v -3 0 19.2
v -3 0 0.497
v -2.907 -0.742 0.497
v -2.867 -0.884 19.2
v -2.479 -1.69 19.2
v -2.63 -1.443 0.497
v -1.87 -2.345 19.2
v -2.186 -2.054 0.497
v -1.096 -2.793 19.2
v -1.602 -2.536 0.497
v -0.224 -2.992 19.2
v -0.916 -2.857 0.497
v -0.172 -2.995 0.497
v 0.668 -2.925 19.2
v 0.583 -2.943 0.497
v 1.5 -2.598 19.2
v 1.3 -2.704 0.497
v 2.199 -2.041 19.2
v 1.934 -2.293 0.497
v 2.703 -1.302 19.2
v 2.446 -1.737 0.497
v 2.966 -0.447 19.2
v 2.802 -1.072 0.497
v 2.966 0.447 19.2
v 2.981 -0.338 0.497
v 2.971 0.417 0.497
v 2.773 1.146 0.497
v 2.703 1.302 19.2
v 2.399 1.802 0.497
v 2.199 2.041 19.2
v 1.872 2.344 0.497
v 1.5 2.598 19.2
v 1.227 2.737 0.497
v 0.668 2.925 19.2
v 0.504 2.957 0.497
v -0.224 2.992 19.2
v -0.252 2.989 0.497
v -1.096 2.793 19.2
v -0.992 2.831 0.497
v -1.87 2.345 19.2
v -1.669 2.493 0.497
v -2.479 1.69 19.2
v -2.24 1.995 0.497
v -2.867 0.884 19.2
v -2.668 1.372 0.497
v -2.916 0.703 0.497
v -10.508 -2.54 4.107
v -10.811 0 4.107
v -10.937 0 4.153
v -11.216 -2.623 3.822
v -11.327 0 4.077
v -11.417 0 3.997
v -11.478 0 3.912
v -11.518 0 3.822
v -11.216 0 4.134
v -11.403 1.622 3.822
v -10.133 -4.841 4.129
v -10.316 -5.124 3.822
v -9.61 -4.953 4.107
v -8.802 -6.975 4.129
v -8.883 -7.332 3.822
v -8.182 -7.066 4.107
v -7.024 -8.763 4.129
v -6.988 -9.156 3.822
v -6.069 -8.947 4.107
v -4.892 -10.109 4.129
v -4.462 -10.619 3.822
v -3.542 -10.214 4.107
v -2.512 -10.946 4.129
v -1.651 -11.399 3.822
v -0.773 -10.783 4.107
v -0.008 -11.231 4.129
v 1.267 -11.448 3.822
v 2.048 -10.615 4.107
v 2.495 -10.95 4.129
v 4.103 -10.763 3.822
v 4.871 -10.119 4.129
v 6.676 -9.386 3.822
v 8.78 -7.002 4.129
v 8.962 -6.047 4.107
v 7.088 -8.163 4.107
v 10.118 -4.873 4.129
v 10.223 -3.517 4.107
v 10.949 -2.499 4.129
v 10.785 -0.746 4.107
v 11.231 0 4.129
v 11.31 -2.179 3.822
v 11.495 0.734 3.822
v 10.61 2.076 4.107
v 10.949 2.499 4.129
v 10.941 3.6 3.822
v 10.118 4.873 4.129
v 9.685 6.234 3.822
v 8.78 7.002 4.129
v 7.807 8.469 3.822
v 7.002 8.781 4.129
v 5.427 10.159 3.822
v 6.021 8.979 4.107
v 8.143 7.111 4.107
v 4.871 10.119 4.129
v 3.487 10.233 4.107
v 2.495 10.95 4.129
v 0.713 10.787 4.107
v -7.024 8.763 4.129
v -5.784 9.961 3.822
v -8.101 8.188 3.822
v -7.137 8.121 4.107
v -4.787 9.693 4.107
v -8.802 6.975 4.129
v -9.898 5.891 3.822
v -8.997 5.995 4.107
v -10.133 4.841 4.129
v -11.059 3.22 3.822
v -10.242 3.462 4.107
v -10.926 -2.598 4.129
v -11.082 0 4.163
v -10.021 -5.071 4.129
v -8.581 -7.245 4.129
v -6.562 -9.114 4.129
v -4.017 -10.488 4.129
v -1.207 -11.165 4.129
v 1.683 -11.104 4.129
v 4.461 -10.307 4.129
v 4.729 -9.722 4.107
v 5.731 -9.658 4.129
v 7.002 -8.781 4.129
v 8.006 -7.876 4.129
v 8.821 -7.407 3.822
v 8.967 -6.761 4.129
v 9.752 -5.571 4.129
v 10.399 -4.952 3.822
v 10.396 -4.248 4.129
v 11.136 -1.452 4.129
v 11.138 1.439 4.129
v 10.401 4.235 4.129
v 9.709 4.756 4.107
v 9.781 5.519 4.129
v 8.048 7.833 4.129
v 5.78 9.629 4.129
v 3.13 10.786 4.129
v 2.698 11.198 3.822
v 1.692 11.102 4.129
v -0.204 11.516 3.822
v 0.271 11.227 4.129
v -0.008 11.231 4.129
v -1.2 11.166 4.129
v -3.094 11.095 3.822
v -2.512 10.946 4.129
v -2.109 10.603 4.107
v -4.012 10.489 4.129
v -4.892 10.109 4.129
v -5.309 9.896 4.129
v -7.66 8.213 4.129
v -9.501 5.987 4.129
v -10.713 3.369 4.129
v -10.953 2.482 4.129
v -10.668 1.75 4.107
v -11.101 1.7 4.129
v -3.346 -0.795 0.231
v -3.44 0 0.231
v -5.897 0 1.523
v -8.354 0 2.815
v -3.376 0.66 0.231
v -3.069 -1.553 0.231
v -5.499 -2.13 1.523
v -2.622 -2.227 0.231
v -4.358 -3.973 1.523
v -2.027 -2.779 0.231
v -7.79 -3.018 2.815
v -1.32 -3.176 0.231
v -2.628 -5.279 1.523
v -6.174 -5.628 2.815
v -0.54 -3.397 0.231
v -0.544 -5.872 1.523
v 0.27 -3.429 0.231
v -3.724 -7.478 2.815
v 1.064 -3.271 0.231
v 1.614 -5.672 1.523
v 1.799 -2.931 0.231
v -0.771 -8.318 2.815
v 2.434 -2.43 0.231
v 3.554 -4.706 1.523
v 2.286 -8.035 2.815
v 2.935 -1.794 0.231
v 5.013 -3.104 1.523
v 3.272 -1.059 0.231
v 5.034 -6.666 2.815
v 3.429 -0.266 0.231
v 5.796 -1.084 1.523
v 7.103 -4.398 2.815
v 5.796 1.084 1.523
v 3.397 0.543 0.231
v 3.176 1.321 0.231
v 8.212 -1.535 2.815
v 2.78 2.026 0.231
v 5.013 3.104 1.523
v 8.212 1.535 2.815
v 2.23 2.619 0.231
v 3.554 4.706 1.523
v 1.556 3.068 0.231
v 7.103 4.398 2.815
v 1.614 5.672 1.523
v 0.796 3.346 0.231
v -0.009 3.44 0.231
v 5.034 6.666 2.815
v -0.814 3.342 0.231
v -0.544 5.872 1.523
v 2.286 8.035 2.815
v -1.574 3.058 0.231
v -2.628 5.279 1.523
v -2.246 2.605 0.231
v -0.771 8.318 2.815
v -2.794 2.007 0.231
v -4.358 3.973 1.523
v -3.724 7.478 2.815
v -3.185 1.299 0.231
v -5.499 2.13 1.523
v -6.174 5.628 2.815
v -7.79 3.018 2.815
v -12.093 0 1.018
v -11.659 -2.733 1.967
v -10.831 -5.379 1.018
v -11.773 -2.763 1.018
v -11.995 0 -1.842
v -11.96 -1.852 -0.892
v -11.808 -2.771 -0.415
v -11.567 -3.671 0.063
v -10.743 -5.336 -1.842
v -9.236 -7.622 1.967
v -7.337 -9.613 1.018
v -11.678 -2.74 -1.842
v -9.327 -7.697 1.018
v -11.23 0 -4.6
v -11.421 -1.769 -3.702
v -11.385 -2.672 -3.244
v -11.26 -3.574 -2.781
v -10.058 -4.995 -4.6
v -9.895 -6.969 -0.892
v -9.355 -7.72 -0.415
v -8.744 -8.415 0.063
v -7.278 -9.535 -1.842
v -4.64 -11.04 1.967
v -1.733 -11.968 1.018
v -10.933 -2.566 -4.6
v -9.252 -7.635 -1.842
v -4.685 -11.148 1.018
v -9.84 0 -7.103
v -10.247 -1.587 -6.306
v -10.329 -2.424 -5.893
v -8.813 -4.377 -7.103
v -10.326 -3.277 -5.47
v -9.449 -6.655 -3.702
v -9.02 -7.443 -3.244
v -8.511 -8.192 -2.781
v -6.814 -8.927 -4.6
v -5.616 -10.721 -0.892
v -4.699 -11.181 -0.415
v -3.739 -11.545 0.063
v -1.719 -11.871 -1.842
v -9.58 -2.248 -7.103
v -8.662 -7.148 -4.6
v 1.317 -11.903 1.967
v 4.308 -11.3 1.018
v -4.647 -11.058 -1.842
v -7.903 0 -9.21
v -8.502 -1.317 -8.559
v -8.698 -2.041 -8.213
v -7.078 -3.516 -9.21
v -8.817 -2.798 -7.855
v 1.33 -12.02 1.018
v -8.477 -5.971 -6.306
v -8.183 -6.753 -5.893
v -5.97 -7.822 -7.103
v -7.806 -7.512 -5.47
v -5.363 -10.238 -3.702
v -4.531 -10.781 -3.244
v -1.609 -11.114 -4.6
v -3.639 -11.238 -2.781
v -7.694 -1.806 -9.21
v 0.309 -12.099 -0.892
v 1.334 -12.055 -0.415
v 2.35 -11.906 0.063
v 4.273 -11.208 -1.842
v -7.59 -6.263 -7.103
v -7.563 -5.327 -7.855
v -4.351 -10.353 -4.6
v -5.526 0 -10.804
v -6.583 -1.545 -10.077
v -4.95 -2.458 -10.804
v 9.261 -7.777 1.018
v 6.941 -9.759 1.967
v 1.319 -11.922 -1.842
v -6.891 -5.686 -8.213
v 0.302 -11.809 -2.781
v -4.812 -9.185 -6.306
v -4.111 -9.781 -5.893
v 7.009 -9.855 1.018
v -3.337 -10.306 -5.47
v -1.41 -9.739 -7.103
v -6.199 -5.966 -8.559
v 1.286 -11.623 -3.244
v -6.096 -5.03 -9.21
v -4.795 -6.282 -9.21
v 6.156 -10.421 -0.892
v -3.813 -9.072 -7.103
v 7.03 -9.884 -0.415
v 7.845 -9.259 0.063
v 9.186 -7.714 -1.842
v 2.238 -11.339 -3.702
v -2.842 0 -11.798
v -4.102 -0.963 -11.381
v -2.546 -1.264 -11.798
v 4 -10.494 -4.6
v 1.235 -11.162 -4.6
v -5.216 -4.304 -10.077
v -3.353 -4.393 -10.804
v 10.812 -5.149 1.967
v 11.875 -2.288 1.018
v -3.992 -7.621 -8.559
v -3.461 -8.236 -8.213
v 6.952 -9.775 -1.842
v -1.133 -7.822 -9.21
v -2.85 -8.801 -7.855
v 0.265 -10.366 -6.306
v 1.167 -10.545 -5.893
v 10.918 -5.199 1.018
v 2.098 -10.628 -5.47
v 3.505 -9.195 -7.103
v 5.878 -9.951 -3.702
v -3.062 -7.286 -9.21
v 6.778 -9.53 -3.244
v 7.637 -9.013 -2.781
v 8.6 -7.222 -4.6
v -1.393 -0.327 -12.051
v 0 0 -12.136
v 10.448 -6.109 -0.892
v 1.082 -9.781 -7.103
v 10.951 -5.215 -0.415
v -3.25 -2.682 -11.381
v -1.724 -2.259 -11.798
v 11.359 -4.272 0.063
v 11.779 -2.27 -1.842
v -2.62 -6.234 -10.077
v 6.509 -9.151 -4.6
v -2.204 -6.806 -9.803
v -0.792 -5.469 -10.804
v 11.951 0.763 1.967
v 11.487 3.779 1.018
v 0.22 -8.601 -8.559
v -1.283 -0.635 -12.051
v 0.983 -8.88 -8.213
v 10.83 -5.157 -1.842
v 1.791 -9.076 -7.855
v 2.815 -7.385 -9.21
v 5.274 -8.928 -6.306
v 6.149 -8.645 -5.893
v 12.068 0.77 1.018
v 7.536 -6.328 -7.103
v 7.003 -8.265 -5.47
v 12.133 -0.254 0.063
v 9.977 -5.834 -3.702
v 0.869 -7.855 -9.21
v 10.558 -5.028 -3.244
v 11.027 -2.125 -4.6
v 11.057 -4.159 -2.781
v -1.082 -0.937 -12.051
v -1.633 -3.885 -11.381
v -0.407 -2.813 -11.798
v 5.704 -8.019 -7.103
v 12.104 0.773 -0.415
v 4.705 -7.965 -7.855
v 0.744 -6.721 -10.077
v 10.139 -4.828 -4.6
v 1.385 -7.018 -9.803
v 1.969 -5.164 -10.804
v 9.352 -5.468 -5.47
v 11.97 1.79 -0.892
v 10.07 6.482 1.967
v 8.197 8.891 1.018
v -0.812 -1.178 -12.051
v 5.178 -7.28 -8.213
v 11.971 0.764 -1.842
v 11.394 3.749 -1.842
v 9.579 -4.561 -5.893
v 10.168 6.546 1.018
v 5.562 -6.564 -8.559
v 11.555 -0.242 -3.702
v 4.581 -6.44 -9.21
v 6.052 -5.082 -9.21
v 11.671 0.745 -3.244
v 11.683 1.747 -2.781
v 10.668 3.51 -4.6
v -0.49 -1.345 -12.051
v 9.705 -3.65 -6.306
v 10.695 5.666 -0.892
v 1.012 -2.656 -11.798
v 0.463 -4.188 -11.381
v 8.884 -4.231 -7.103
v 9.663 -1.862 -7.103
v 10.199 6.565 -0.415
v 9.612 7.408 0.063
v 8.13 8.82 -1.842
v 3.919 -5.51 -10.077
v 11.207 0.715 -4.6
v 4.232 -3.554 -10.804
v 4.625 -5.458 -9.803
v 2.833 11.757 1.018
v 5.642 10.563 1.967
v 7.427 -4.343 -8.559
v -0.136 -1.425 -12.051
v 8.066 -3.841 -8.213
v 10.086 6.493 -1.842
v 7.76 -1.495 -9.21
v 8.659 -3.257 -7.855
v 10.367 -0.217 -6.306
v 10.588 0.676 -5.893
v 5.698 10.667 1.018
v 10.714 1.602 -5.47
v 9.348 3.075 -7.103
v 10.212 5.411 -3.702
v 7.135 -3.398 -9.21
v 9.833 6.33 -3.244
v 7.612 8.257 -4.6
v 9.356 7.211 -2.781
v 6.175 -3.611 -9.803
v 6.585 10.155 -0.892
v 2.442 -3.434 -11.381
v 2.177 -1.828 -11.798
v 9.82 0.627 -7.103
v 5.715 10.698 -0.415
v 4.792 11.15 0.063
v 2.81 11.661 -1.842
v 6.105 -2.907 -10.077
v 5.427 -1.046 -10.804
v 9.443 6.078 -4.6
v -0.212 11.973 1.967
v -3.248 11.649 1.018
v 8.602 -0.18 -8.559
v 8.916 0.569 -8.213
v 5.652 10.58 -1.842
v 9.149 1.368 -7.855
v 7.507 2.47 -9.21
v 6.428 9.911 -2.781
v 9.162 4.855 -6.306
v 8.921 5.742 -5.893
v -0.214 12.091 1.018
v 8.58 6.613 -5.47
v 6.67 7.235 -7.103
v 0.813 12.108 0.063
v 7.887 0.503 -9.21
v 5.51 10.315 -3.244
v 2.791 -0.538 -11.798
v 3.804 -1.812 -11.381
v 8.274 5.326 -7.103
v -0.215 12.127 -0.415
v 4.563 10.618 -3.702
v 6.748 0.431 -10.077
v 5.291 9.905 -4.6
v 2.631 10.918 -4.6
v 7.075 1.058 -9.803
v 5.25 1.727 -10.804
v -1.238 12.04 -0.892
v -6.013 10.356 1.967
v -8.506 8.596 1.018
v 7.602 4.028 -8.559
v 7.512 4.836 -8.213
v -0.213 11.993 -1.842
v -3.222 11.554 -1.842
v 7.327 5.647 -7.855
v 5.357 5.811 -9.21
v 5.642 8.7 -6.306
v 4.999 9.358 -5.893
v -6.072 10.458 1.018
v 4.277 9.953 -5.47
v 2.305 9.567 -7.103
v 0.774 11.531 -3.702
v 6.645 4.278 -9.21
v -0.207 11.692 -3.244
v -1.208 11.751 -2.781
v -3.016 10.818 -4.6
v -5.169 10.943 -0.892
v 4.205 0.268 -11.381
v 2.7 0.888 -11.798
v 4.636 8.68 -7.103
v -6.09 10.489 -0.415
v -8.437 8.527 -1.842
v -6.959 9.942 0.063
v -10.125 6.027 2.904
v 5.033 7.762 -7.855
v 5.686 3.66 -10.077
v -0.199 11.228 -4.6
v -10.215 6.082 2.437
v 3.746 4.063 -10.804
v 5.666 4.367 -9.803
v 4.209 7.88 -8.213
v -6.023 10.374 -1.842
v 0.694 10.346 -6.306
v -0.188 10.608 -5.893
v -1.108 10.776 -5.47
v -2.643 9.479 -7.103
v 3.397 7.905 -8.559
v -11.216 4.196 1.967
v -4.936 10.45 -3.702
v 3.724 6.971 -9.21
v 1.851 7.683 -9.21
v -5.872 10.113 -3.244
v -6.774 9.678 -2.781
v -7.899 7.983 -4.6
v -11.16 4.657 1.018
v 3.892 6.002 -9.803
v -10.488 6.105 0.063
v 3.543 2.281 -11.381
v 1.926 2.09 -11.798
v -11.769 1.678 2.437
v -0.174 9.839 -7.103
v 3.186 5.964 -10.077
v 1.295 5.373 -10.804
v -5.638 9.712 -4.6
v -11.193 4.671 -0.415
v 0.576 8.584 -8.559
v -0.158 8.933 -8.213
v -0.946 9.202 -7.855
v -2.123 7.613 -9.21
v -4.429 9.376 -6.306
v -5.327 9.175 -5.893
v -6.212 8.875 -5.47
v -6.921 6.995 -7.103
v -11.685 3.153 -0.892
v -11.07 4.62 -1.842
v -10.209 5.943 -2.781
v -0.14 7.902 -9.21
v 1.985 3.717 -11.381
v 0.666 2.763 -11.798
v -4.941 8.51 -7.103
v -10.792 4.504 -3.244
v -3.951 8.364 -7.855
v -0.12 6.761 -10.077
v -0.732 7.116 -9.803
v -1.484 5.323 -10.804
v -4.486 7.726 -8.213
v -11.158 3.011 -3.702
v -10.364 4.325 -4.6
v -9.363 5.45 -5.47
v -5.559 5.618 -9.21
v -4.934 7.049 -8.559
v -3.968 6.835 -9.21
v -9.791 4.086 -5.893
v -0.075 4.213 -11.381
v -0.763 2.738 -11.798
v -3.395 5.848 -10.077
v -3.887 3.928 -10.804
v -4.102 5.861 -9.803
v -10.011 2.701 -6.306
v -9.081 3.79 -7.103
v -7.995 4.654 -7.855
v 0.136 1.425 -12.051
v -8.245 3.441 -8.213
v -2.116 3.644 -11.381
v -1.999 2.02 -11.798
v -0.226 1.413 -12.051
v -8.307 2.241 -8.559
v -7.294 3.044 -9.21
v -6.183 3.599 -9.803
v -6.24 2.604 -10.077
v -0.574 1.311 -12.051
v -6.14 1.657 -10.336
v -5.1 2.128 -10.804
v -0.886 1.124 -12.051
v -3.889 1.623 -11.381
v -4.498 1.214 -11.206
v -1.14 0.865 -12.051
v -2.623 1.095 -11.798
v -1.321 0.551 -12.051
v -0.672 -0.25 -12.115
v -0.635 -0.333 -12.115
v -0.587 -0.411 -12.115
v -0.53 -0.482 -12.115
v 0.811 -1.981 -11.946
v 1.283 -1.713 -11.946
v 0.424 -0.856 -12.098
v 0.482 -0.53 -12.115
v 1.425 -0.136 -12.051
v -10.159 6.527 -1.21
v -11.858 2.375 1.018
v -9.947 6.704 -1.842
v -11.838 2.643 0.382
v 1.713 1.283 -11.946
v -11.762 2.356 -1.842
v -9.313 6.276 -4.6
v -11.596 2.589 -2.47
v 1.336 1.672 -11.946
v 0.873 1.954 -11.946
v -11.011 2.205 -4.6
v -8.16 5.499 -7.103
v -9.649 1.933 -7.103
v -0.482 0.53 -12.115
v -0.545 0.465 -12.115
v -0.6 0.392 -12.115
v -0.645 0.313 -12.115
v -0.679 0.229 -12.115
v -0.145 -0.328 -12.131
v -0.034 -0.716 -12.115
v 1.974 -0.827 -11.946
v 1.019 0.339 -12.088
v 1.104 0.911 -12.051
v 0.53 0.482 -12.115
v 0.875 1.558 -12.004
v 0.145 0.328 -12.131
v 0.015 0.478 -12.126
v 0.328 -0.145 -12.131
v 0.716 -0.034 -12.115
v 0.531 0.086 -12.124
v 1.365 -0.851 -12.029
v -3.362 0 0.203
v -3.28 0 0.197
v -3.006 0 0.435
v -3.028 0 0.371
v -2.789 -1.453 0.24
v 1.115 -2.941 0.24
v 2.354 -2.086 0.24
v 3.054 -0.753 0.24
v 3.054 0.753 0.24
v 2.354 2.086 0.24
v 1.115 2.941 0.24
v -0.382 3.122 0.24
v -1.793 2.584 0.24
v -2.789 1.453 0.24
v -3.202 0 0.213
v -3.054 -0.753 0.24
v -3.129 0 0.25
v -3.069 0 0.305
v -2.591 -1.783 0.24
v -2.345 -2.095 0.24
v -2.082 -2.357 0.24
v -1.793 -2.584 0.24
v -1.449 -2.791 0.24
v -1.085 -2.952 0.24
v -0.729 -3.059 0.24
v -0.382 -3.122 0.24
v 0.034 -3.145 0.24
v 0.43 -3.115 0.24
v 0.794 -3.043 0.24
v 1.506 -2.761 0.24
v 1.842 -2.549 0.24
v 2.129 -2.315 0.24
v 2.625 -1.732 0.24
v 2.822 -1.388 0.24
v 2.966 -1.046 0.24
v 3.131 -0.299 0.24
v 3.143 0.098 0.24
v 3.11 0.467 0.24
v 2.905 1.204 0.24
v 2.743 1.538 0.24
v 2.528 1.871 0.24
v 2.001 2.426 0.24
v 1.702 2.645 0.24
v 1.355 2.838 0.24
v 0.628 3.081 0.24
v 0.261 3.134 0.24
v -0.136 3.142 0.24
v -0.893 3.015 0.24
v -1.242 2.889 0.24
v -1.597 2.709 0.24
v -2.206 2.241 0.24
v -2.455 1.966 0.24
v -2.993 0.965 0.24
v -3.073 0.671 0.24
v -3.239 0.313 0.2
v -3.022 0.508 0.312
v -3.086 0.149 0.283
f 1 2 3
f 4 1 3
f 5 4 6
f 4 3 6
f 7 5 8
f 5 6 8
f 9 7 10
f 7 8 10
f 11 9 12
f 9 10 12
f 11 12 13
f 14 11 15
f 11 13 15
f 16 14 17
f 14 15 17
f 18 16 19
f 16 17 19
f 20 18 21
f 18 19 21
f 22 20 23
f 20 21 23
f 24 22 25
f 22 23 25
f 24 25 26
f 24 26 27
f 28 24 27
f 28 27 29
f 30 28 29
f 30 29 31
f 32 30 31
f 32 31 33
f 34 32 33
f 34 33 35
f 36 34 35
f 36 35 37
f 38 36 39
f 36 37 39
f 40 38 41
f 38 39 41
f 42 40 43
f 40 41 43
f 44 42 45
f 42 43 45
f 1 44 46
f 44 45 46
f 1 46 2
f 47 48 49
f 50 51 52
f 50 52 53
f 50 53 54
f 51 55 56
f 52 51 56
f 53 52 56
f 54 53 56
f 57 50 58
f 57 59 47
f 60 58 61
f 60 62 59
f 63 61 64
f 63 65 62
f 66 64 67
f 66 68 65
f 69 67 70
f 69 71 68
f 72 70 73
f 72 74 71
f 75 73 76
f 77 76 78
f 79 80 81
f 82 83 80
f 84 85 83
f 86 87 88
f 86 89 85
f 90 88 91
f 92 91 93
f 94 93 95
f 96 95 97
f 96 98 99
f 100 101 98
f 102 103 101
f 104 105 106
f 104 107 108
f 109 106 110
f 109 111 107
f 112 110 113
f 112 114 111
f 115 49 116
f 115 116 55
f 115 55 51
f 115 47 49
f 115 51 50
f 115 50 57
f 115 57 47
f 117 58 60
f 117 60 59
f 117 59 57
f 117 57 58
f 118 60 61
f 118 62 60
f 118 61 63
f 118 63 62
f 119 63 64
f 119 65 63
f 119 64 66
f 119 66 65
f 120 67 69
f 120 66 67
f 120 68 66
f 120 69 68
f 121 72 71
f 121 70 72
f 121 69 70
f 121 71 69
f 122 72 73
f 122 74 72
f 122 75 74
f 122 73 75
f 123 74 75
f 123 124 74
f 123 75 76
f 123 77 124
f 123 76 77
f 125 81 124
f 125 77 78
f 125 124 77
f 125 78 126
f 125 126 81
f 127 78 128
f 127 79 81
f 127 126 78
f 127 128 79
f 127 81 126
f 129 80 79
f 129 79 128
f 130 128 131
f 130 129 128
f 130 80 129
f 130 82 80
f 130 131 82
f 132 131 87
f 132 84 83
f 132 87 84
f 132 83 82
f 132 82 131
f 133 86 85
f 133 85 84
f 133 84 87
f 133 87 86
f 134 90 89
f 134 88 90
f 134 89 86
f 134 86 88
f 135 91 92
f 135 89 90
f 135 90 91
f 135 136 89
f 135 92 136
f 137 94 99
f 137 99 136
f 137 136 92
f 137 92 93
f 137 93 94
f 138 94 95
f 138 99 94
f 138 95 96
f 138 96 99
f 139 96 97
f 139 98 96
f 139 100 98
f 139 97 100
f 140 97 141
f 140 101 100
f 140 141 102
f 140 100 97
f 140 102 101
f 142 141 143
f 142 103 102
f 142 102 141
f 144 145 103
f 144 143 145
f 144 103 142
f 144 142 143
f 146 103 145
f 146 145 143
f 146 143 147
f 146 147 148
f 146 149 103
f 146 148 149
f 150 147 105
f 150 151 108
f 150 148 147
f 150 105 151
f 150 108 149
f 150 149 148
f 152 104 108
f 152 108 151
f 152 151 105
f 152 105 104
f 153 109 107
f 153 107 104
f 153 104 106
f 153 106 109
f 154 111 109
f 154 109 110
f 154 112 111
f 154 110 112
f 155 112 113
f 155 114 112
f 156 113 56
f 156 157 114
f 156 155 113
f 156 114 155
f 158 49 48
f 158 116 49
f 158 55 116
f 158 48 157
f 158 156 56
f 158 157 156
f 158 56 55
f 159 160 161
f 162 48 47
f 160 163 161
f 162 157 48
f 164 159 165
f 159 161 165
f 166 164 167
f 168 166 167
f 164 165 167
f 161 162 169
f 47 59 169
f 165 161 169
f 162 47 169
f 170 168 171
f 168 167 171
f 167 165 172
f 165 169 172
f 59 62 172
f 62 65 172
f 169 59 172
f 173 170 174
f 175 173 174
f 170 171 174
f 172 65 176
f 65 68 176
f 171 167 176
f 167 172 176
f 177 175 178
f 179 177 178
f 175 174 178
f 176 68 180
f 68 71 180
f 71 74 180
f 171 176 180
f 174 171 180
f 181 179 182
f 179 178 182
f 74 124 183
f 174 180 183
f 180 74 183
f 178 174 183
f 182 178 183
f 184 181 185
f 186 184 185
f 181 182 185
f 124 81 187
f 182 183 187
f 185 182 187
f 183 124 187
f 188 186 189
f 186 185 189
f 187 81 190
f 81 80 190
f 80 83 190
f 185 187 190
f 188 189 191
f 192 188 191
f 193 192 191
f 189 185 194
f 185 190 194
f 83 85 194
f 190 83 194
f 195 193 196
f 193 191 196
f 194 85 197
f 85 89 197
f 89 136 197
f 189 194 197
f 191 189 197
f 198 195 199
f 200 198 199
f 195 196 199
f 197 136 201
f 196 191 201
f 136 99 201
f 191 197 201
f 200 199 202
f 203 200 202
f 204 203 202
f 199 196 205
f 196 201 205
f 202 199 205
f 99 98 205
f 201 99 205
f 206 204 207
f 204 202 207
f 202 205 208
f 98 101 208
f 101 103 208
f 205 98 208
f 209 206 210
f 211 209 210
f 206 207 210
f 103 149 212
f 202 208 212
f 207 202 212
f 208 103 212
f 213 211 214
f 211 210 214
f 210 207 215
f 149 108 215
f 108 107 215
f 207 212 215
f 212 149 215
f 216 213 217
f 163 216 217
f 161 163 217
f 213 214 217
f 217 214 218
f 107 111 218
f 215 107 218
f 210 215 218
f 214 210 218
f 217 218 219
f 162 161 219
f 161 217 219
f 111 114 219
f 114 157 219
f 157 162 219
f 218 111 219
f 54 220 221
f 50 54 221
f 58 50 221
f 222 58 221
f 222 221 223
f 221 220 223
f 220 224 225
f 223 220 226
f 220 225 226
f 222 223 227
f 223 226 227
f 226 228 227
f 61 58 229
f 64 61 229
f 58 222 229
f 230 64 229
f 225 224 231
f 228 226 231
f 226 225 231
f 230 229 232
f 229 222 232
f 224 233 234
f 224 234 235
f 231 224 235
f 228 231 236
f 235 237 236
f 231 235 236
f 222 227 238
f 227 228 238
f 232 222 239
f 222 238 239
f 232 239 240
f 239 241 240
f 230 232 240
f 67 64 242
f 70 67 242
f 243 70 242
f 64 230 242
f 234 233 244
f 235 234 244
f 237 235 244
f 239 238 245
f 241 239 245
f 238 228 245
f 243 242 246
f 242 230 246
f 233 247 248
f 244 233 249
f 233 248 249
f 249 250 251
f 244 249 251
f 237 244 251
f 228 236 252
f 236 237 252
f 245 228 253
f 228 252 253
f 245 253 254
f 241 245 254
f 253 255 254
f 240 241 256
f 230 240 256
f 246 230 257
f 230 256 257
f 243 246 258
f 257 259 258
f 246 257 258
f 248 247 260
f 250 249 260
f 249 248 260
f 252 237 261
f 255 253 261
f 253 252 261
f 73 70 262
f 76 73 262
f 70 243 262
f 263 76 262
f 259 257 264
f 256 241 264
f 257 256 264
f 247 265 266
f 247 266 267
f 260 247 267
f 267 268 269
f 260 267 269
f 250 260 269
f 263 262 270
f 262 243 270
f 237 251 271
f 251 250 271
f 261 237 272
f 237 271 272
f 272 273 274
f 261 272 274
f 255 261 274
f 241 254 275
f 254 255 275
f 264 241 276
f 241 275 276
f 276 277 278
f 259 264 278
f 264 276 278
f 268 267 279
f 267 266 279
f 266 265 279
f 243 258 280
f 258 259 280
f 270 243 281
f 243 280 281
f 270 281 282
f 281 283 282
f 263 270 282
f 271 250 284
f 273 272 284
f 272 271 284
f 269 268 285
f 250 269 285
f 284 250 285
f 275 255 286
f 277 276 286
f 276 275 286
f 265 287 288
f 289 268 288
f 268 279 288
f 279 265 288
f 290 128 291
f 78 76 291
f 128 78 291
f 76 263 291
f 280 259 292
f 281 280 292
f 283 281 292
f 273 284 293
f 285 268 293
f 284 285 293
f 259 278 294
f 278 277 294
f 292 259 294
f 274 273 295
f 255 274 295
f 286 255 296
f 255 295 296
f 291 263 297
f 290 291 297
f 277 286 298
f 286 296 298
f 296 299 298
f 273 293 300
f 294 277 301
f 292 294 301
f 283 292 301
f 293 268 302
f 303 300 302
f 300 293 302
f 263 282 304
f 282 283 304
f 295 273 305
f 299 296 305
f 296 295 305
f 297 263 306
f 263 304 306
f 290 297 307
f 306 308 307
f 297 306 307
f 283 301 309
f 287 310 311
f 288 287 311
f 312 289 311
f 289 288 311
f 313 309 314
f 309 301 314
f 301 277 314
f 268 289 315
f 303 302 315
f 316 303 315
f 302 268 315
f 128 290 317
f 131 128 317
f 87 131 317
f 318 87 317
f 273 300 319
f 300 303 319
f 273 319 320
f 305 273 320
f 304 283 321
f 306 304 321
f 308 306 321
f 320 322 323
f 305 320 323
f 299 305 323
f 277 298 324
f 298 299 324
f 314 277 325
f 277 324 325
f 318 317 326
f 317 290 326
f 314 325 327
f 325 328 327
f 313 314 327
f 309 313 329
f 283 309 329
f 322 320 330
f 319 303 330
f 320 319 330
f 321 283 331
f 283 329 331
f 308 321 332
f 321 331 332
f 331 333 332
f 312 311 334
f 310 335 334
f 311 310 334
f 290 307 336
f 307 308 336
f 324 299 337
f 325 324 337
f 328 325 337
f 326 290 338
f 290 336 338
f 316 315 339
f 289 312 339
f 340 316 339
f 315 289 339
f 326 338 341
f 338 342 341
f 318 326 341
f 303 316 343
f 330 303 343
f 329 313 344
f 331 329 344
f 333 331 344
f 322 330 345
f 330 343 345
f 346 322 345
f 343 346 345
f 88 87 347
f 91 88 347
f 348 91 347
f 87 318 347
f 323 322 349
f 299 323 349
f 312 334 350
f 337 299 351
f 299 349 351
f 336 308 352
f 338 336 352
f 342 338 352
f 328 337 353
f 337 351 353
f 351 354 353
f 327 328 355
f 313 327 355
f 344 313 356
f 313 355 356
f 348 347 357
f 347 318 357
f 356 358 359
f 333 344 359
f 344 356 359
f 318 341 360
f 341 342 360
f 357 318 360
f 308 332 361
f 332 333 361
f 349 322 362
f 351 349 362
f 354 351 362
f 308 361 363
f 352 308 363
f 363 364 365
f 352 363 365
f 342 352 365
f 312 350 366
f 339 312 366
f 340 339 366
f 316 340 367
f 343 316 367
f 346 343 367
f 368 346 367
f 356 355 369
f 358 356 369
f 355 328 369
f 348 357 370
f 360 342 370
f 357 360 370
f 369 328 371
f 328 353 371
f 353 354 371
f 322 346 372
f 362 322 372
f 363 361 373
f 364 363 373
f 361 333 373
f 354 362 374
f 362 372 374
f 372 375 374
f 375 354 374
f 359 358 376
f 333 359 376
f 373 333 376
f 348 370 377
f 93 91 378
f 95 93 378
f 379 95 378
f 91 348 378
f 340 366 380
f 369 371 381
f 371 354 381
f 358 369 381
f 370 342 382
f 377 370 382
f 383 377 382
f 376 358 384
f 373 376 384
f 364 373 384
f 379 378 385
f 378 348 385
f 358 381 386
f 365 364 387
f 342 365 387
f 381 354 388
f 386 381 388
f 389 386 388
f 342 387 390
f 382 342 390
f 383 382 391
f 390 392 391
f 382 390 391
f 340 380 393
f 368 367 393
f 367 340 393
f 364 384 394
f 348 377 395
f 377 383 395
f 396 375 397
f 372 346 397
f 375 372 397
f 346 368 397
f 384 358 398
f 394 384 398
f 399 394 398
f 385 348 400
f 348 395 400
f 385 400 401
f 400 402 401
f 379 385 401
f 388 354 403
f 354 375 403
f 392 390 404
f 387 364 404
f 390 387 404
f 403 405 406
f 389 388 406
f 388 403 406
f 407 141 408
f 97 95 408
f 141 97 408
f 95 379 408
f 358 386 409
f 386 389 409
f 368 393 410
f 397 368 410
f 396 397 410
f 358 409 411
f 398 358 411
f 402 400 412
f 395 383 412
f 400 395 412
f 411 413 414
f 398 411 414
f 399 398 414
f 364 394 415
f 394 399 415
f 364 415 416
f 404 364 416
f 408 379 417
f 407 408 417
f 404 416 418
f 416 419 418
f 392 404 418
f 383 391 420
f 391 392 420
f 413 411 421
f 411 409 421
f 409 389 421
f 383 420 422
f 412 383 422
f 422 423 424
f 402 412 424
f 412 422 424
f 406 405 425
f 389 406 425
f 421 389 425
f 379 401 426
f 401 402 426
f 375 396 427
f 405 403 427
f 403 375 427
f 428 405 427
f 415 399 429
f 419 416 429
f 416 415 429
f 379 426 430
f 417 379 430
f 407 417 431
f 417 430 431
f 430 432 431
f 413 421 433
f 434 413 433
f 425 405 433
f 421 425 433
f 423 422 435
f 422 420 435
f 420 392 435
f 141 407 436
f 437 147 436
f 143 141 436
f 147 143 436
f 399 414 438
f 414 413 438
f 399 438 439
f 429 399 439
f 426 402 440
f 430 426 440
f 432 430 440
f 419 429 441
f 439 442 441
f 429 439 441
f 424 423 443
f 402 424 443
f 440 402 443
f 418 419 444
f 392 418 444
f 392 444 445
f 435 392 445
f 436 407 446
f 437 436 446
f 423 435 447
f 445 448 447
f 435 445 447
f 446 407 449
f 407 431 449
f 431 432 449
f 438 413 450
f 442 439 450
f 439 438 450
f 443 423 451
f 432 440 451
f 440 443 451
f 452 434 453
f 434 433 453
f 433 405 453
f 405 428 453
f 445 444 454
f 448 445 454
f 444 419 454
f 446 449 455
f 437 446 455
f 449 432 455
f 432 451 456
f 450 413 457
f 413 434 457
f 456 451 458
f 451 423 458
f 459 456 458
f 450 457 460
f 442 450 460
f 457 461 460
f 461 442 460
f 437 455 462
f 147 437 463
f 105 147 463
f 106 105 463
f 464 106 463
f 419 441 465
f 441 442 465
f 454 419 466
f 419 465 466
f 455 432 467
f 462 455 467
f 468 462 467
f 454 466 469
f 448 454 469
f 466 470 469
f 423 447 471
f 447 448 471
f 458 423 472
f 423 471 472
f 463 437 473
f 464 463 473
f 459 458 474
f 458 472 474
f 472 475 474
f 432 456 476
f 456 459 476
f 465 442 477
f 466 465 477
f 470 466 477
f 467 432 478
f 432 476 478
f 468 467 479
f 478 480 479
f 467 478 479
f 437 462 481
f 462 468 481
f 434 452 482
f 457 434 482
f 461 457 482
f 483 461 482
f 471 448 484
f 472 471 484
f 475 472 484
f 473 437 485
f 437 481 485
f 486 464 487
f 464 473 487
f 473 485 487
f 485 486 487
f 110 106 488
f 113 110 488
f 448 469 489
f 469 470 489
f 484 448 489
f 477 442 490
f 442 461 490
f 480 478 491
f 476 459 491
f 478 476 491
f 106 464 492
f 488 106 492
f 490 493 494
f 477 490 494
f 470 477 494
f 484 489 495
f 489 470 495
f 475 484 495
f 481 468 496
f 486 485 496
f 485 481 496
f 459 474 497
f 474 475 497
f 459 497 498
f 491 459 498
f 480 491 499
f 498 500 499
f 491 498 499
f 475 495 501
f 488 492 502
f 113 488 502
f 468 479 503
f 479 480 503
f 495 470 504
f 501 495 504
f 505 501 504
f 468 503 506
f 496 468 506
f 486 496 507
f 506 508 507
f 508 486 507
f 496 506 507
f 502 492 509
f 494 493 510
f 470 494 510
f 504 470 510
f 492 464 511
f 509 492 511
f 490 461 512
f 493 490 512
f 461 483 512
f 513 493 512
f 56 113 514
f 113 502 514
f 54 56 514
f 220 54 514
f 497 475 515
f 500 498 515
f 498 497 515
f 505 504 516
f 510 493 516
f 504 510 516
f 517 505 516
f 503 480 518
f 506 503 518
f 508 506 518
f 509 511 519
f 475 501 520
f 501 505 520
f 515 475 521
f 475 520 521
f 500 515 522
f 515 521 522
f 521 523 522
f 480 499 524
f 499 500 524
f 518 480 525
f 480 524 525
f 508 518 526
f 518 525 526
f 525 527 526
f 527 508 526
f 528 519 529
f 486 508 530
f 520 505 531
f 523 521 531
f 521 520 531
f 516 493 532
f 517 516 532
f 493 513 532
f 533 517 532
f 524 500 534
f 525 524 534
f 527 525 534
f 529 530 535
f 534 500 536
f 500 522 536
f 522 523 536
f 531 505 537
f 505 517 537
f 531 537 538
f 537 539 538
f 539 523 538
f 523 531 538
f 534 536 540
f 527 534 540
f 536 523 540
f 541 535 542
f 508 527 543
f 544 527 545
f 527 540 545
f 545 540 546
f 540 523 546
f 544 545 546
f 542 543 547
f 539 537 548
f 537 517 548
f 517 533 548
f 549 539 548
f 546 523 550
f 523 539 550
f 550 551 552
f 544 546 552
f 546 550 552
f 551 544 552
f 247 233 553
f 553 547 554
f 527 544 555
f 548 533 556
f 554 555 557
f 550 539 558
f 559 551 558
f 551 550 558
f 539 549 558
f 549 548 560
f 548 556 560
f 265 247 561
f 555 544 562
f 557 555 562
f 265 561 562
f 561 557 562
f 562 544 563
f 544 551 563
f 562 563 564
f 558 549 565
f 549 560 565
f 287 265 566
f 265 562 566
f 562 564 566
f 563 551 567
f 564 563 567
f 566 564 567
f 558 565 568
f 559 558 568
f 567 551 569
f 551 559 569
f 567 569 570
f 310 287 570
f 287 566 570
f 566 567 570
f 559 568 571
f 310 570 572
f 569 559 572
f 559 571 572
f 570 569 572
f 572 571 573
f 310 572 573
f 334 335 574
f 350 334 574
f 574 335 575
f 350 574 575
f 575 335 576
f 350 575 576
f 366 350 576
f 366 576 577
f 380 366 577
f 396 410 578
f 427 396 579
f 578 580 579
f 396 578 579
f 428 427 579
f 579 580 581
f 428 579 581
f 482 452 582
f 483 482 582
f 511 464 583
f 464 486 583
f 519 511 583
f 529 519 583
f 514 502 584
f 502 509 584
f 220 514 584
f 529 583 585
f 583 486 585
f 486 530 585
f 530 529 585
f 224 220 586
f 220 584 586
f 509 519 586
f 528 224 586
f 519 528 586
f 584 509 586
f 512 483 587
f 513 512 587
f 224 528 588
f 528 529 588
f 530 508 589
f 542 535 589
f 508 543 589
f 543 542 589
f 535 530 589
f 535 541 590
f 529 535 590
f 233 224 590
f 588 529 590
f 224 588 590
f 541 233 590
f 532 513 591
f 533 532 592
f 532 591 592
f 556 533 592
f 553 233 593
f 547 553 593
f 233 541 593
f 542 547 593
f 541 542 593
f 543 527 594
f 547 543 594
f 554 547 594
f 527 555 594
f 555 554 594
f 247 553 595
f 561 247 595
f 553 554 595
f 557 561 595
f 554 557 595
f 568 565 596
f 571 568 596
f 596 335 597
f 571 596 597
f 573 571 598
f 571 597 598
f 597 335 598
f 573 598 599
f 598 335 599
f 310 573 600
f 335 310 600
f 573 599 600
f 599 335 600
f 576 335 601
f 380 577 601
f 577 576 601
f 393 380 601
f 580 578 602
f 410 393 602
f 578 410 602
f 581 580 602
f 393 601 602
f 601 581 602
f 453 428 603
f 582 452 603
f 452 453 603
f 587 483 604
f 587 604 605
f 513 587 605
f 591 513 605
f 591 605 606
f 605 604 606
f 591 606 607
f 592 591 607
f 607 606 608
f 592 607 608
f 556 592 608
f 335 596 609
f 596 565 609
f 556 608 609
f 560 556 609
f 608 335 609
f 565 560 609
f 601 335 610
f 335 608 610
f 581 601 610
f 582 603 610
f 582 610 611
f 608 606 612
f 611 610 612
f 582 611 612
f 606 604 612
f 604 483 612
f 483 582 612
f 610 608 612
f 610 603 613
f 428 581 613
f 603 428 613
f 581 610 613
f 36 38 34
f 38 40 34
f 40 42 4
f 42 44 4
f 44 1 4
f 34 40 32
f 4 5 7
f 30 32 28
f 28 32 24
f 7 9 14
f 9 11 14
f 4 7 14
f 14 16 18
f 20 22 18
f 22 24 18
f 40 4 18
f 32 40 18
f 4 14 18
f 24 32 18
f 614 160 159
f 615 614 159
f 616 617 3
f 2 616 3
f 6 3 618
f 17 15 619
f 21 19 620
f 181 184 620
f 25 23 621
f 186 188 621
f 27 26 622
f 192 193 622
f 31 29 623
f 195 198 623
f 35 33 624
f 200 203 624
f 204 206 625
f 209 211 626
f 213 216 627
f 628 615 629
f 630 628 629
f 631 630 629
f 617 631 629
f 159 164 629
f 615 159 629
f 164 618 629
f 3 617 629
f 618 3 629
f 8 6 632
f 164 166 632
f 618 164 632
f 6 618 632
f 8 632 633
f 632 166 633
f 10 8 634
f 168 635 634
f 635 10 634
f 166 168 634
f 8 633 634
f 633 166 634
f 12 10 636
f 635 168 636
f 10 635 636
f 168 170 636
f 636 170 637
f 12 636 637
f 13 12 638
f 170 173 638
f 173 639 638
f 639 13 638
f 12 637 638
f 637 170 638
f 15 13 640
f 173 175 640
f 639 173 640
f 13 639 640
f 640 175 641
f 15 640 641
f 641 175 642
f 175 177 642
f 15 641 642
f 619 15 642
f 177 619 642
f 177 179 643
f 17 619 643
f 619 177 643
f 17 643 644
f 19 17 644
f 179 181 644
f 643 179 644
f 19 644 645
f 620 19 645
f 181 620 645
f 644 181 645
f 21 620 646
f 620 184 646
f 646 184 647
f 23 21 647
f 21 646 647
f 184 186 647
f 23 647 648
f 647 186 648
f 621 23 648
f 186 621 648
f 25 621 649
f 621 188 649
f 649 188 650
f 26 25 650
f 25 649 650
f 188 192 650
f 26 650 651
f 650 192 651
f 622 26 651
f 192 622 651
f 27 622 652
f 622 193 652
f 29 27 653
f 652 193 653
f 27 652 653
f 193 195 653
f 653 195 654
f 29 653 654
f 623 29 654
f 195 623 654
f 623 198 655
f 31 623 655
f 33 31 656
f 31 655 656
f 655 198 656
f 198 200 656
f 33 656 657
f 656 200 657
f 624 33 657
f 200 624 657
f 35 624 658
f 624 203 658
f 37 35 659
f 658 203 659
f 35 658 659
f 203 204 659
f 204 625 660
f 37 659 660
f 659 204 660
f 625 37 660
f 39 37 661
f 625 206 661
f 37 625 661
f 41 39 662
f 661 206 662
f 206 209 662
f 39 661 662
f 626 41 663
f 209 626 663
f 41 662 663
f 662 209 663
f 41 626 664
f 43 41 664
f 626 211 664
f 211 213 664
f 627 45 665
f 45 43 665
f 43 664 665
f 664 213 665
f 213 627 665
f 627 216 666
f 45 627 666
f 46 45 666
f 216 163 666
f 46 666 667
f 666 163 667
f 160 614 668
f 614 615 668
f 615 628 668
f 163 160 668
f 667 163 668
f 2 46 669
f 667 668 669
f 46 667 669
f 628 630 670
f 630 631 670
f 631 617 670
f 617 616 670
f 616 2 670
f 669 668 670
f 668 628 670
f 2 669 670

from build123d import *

# Parameters (mm, degrees)
F2_R = 0.5
F3_R = 0.3


with BuildPart() as f1:
    # F0 (on Front) → F1 (revolve)
    with BuildSketch(Plane.XZ):
        with BuildLine():
            Line((0, -12.135852), (0, 19.2))
            Line((0, 19.2), (-3, 19.2))
            Line((-3, 19.2), (-3, 0))
            Line((-3, 0), (-11.319818, 4.375))
            ThreePointArc((-11.319818, 4.375), (-10.009327, -6.862381), (0, -12.135852))
        make_face()
    revolve(axis=Axis((0, 0, 2.5), (0, 0, 1)))

    # F2
    f2_edges = [f1.edges().sort_by_distance(p)[0] for p in [
        (11.319818, 0, 4.375),
    ]]
    fillet(f2_edges, radius=F2_R)

    # F3
    f3_edges = [f1.edges().sort_by_distance(p)[0] for p in [
        (3, 0, 0),
    ]]
    fillet(f3_edges, radius=F3_R)


solid = f1.part
